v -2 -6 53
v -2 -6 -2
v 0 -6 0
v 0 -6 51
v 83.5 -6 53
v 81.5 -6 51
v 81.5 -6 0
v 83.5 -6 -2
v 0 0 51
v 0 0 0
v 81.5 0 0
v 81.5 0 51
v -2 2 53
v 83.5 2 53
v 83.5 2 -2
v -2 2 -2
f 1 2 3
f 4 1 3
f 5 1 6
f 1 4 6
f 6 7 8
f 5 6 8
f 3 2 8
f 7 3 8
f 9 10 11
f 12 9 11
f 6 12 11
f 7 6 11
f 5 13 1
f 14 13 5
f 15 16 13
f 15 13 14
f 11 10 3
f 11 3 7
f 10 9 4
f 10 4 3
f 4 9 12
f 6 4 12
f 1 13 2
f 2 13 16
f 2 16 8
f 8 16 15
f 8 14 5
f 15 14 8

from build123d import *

# Parameters (mm, degrees)
SKETCH1_W           = 81.5
SKETCH1_H           = 51
BOSS_EXTRUDE1_DEPTH = 2
SKETCH2_W           = 85.5
SKETCH2_H           = 55
SKETCH2_W_2         = 81.5
SKETCH2_H_2         = 51
BOSS_EXTRUDE2_DEPTH = 8


with BuildPart() as part:
    # Sketch1 → Boss-Extrude1 (new body)
    with BuildSketch(Plane(origin=(0, 0, 0), x_dir=(1, 0, 0), z_dir=(0, 1, 0))):
        with Locations((40.75, -25.5)):
            Rectangle(SKETCH1_W, SKETCH1_H)
    extrude(amount=BOSS_EXTRUDE1_DEPTH)

    # Sketch2 → Boss-Extrude2 (add)
    with BuildSketch(Plane(origin=(0, 2, 0), x_dir=(1, 0, 0), z_dir=(0, 1, 0))):
        with Locations((40.75, -25.5)):
            Rectangle(SKETCH2_W, SKETCH2_H)
        with Locations((40.75, -25.5)):
            Rectangle(SKETCH2_W_2, SKETCH2_H_2, mode=Mode.SUBTRACT)
    extrude(amount=-BOSS_EXTRUDE2_DEPTH)


solid = part.part
